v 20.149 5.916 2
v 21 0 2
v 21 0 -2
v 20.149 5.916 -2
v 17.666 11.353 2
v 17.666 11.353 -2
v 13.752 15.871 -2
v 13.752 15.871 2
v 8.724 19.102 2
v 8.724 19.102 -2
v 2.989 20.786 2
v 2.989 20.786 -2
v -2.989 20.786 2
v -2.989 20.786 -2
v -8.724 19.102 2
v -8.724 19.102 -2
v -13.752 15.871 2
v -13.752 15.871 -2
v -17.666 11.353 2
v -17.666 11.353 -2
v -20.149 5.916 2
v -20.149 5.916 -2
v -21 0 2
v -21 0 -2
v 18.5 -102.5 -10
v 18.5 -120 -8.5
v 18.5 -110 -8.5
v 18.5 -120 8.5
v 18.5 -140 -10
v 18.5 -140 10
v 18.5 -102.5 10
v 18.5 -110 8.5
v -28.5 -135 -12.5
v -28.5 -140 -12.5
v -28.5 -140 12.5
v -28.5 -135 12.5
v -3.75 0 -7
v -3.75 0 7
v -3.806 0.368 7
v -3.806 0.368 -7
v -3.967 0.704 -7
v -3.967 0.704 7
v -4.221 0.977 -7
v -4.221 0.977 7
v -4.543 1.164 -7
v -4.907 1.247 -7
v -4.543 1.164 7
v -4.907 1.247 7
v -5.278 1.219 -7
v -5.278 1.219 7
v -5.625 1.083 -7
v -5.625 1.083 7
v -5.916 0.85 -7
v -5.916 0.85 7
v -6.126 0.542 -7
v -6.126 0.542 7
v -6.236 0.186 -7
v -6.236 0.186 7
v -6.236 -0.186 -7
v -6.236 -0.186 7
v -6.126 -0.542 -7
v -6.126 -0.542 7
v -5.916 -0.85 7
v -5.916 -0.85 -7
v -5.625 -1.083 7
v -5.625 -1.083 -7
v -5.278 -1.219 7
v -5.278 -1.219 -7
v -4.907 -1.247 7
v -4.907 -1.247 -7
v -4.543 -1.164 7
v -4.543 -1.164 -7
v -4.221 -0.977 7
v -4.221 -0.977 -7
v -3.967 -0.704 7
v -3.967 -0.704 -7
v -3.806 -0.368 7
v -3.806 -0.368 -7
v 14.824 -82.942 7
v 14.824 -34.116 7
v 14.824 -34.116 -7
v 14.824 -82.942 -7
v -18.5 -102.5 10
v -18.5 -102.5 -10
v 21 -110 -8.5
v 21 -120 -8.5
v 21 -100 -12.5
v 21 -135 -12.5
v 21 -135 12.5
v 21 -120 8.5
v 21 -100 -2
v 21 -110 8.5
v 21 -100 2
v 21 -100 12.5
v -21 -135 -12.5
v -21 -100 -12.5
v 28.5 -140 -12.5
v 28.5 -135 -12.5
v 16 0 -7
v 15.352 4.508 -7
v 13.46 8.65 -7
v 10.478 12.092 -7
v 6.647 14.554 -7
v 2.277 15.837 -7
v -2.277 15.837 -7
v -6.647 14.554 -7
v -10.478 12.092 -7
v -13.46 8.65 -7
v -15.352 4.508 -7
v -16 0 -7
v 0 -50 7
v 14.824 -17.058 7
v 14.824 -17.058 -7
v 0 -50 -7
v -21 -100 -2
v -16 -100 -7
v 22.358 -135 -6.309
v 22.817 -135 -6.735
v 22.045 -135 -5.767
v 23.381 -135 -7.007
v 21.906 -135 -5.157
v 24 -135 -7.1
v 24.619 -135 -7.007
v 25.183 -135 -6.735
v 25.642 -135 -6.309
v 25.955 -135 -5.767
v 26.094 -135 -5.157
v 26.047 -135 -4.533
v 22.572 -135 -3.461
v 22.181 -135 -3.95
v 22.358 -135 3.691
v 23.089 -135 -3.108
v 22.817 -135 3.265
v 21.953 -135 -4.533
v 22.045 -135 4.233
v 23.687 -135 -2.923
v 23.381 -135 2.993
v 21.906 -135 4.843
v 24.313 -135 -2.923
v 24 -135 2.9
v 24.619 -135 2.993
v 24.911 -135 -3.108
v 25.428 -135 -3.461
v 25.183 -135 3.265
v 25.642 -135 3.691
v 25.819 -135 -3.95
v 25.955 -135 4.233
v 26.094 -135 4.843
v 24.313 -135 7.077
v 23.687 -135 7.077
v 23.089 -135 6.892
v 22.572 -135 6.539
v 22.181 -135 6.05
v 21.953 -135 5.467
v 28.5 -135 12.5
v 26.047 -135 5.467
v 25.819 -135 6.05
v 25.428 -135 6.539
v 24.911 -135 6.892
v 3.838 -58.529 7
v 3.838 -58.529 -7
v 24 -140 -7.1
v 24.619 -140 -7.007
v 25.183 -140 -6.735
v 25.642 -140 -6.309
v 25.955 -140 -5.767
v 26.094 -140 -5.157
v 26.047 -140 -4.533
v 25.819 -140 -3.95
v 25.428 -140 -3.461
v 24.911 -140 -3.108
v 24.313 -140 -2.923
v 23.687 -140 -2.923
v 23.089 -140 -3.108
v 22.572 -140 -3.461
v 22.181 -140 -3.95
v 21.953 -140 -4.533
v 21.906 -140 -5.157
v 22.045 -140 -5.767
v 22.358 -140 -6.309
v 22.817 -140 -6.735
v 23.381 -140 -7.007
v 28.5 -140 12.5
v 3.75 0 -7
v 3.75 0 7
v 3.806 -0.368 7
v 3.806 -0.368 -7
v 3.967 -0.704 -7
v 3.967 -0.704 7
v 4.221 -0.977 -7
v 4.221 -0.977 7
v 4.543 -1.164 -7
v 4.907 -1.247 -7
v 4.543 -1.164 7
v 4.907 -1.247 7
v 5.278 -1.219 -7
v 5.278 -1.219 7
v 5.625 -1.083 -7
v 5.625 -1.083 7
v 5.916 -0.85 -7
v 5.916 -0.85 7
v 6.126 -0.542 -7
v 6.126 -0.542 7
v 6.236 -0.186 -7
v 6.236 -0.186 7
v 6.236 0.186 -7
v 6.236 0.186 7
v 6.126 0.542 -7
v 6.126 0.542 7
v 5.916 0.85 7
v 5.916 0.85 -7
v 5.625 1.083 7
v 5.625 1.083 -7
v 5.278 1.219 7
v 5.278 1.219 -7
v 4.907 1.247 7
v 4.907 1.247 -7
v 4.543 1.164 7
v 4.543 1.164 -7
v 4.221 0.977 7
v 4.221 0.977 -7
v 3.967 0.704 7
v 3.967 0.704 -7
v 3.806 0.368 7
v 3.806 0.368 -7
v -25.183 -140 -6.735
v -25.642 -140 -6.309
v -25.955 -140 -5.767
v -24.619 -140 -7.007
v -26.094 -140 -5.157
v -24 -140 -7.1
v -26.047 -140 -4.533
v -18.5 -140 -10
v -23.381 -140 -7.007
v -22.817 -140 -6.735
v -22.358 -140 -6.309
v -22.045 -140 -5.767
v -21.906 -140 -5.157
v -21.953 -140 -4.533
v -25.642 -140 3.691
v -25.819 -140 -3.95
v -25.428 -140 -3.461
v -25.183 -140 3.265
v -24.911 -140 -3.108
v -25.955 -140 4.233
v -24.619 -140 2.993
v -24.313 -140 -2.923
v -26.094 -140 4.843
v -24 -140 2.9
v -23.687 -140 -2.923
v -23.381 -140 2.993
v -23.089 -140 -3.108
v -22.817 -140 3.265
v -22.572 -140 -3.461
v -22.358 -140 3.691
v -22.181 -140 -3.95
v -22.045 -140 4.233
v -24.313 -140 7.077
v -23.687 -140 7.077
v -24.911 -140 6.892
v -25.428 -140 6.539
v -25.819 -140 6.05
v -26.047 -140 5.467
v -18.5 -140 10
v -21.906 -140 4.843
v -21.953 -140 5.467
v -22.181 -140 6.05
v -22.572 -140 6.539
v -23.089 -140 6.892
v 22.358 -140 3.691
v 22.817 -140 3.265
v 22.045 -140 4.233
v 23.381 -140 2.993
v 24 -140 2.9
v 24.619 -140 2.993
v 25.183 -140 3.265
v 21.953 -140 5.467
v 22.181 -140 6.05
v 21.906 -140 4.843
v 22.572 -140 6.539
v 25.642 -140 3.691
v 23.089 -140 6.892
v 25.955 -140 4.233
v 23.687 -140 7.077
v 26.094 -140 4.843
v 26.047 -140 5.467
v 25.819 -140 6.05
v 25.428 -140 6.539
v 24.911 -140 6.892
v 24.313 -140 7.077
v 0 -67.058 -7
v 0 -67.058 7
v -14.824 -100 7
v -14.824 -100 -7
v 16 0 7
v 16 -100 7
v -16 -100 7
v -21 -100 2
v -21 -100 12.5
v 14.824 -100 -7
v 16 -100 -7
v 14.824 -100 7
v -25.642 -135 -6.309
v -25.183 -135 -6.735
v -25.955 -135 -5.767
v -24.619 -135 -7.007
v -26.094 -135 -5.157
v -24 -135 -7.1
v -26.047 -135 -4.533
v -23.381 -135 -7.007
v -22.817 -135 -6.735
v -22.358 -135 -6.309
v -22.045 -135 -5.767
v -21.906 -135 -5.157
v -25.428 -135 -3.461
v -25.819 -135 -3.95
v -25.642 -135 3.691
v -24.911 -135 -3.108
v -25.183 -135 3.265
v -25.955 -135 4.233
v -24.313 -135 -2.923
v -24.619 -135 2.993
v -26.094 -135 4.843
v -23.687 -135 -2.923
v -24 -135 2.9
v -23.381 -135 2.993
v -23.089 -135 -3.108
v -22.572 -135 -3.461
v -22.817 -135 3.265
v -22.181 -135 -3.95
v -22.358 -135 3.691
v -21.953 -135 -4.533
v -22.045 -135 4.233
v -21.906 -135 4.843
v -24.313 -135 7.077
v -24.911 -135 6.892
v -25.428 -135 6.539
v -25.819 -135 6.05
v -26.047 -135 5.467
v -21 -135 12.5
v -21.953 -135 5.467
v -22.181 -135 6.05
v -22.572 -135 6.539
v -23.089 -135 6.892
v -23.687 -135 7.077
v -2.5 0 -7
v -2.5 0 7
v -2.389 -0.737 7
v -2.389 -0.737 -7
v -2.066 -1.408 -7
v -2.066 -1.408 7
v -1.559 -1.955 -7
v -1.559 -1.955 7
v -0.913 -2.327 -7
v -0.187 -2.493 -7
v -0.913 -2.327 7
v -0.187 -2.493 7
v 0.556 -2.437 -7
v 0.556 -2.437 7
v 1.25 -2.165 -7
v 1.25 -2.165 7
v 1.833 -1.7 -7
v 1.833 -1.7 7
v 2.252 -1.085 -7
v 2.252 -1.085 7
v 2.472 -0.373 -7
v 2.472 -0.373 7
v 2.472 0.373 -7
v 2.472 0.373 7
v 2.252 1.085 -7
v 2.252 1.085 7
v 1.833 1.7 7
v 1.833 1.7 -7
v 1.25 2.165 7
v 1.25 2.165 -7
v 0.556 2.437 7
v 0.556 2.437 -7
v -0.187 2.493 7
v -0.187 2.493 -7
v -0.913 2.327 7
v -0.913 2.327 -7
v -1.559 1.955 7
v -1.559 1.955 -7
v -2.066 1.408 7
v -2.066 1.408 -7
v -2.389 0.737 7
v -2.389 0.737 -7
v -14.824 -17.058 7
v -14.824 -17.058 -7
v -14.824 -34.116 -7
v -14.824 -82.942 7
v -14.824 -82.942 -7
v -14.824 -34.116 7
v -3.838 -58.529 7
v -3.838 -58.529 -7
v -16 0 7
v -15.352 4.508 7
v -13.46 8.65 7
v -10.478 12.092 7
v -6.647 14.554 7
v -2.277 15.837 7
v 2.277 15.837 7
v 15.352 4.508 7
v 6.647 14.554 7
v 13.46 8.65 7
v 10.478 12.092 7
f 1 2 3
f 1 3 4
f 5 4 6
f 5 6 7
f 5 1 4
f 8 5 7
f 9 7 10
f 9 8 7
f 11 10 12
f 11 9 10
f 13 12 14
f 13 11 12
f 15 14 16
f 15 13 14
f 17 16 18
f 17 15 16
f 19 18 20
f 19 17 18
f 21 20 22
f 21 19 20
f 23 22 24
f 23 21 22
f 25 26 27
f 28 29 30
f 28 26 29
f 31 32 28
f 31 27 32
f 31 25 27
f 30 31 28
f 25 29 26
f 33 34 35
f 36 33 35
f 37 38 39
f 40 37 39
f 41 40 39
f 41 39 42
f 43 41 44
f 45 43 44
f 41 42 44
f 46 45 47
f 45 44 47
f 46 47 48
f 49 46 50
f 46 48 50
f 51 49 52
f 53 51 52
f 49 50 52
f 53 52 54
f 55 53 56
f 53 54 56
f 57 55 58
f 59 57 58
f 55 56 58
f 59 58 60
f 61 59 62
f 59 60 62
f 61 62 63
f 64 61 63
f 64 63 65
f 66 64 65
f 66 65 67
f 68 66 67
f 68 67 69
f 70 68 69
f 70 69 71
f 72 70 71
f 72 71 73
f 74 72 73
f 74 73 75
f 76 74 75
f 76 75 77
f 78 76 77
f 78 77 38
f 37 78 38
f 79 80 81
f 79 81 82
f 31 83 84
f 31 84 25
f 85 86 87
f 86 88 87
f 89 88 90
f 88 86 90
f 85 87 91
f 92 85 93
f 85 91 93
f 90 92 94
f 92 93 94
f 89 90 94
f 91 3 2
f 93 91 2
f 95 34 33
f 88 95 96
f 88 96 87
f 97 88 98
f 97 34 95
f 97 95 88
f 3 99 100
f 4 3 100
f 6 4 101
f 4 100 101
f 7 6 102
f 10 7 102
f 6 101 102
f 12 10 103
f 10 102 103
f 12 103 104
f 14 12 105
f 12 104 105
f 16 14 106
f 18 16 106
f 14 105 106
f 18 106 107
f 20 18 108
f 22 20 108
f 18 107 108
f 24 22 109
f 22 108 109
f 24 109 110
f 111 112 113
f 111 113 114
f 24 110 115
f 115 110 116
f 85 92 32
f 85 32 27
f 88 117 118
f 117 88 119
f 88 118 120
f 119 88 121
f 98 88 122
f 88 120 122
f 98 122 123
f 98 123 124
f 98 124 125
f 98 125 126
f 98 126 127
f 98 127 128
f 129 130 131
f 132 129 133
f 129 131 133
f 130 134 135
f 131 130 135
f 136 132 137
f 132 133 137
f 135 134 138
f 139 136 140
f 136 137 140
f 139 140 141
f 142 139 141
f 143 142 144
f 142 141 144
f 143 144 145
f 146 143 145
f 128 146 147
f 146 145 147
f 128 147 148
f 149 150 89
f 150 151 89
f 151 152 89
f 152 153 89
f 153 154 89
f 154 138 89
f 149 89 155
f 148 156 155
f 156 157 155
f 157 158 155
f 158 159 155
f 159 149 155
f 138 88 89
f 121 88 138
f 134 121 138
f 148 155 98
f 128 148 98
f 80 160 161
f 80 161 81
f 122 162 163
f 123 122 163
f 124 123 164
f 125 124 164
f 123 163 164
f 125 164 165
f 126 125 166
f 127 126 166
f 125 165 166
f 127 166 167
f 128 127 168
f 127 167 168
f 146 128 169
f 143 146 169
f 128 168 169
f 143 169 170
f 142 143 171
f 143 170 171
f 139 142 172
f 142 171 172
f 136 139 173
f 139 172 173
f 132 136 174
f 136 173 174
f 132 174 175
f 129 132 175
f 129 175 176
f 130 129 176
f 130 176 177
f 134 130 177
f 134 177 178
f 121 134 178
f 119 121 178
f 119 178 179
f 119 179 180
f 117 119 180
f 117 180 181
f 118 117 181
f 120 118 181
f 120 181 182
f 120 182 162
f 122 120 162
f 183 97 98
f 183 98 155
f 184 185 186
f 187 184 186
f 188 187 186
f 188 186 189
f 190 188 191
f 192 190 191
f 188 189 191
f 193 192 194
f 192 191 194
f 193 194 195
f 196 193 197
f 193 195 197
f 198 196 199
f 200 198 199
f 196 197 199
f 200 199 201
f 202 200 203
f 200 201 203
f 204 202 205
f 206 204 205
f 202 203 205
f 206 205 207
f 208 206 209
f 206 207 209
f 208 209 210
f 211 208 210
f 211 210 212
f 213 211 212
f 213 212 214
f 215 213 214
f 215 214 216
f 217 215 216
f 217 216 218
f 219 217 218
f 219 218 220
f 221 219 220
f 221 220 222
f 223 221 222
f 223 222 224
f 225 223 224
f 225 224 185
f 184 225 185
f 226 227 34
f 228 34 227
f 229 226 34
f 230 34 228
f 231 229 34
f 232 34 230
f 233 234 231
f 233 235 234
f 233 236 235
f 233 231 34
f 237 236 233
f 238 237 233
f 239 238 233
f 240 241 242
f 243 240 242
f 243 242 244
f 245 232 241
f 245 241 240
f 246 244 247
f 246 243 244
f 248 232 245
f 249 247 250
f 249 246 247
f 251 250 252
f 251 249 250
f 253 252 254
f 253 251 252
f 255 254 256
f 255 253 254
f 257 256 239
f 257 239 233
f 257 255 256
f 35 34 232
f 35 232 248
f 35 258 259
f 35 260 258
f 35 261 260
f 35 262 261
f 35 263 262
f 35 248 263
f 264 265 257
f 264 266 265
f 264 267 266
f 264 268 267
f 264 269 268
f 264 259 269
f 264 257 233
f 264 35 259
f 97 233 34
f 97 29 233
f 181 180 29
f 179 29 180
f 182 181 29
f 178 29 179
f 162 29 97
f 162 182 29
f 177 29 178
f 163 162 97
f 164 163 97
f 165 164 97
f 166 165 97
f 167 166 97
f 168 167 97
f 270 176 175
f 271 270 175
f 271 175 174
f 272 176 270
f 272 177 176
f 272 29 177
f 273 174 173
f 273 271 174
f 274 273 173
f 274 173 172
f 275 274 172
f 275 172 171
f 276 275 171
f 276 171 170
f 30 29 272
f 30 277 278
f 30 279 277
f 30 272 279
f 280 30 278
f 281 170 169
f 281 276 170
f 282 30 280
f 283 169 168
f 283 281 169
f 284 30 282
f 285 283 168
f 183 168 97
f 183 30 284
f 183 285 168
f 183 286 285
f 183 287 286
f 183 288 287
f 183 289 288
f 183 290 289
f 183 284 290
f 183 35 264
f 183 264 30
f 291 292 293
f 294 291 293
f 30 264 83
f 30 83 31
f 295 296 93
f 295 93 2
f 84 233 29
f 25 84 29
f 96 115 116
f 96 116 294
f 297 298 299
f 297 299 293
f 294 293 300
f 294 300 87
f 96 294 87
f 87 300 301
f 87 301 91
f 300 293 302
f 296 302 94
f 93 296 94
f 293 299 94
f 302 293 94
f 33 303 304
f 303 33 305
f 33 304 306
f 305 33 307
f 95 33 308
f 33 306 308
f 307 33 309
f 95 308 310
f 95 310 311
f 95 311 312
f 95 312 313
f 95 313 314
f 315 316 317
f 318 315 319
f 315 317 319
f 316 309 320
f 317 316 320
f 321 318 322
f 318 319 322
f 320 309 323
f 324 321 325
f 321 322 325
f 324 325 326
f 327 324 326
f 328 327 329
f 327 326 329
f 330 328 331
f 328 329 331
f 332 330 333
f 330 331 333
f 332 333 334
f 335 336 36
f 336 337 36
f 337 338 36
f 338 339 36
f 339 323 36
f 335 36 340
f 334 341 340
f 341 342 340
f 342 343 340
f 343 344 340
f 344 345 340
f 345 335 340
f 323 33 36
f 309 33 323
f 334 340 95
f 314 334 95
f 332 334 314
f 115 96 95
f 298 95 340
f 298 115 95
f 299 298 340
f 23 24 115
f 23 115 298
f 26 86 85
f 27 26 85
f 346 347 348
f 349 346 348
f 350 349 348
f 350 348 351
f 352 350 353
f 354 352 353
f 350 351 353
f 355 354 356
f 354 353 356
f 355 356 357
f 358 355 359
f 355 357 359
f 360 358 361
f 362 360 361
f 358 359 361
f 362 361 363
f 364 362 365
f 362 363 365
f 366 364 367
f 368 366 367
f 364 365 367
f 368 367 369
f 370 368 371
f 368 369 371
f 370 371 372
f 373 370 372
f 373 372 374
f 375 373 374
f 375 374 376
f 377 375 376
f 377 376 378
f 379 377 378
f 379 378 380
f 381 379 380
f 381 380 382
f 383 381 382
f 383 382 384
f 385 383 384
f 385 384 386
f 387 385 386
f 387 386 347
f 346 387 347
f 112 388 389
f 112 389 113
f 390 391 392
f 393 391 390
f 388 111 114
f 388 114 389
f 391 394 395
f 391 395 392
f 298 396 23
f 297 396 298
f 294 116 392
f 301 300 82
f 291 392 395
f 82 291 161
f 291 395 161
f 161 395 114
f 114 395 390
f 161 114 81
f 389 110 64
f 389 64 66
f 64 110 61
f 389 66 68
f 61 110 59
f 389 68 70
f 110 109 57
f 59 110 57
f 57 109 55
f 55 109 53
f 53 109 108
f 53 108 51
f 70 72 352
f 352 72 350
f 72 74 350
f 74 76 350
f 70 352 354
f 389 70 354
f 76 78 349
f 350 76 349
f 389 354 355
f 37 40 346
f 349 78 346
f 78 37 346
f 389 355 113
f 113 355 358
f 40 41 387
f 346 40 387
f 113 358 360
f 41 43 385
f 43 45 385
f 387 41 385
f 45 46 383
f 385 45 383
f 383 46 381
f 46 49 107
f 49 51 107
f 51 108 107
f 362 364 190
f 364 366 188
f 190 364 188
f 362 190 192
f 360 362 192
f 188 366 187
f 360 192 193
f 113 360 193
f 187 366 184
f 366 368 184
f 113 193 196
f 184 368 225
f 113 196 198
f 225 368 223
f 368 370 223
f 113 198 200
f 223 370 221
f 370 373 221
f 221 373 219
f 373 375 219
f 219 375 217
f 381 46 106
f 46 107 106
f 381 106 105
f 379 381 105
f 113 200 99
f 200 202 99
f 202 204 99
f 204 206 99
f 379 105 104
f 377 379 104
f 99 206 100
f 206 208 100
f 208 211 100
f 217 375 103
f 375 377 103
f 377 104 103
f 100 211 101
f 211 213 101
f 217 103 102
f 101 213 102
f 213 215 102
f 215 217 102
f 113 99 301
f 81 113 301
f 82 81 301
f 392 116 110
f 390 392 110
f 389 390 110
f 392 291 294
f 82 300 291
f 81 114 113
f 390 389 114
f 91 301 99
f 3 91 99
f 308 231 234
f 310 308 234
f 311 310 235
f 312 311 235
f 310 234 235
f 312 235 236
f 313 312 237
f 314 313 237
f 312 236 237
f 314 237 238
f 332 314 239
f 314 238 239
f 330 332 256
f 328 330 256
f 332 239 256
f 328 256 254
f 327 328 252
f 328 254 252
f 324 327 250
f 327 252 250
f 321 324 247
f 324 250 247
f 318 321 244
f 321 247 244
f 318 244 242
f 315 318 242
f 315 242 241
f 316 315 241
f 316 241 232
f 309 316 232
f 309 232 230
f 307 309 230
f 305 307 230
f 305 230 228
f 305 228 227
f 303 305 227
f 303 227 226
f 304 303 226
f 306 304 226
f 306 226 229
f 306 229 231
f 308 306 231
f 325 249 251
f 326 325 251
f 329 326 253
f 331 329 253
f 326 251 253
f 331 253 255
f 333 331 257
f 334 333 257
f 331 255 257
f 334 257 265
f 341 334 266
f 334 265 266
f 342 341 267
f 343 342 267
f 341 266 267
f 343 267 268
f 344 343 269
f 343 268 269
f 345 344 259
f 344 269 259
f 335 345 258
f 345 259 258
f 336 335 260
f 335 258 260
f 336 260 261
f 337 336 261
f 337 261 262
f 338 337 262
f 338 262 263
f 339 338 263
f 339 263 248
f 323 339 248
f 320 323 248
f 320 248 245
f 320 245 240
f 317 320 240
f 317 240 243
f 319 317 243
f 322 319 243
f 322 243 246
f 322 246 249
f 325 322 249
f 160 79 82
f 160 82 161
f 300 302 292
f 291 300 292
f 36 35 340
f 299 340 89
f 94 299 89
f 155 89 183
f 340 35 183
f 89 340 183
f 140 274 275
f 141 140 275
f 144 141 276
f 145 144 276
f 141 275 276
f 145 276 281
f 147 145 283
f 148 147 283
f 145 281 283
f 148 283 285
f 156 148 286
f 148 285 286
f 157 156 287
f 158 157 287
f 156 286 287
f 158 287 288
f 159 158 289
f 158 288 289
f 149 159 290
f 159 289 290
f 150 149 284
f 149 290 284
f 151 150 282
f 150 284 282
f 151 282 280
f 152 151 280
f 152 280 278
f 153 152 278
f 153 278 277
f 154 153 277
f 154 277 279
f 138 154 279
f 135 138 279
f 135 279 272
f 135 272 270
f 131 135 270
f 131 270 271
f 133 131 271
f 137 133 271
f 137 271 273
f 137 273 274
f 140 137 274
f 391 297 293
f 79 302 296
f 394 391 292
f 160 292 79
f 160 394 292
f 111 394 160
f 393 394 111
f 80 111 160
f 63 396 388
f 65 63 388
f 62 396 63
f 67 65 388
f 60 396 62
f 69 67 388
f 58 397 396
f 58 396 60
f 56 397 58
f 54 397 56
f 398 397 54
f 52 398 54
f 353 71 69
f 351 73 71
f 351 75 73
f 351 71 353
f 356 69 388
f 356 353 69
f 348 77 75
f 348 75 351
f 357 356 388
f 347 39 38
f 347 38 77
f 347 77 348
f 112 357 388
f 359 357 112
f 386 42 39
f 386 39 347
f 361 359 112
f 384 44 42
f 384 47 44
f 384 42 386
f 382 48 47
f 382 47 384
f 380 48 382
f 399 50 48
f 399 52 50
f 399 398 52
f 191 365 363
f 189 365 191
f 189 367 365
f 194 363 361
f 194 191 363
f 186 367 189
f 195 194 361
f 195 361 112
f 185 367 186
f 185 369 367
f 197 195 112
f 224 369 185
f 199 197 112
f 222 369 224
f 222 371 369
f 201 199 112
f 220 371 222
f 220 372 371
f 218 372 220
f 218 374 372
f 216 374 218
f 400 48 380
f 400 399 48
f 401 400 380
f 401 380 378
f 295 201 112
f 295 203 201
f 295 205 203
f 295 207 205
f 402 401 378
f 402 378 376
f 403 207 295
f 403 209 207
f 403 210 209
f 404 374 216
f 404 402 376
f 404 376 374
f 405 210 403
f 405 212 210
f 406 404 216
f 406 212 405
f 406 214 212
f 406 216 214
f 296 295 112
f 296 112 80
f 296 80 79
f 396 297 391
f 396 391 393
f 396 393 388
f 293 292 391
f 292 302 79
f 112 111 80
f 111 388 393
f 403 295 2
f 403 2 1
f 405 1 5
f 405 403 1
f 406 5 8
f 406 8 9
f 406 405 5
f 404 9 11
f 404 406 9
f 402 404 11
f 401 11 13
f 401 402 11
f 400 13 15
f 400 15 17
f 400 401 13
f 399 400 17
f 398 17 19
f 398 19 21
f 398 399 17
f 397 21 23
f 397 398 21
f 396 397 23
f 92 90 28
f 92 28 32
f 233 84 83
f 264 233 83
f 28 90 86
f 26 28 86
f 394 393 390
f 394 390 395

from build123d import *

# Parameters (mm, degrees)
BOSS_EXTRUDE1_DEPTH = 7
SKETCH2_W           = 42
SKETCH2_H           = 25
BOSS_EXTRUDE2_DEPTH = 40
SHELL1_T            = -2.5
CUT_EXTRUDE5_REACH  = 144.903
SKETCH9_W           = 10
SKETCH9_H           = 25
BOSS_EXTRUDE3_DEPTH = 5
CUT_EXTRUDE6_REACH  = 151.018
SKETCH10_W          = 17
SKETCH10_H          = 10
CUT_EXTRUDE8_REACH  = 146.196
CUT_EXTRUDE9_REACH  = 165.98
SKETCH13_R          = 2.1
CHAMFER1_SIZE       = 5


with BuildPart() as part:
    # Sketch1 → Boss-Extrude1 (new, symmetric)
    with BuildSketch(Plane.XY):
        with BuildLine():
            Line((-21, 0), (-21, -100))
            Line((-21, -100), (21, -100))
            Line((21, -100), (21, 0))
            ThreePointArc((21, 0), (0, 21), (-21, 0))
        make_face()
    extrude(amount=BOSS_EXTRUDE1_DEPTH, both=True)


with BuildPart() as body_2:
    # Sketch2 → Boss-Extrude2 (new body)
    with BuildSketch(Plane.XZ.offset(100)):
        Rectangle(SKETCH2_W, SKETCH2_H)
    extrude(amount=BOSS_EXTRUDE2_DEPTH)

    # Shell1
    shell1_openings = [body_2.faces().sort_by_distance(p)[0] for p in [
        (0, -140, 0),
    ]]
    offset(amount=SHELL1_T, openings=shell1_openings, kind=Kind.INTERSECTION)


with BuildPart() as part_1:
    add(part.part)

    # Combine1: union body 2
    add(body_2.part)

    # Sketch8 → Cut-Extrude5 (cut, up to next)
    with BuildSketch(Plane.XY.offset(7), mode=Mode.PRIVATE) as cut_extrude5_sk1:
        with BuildLine():
            ThreePointArc((-3.75, 0), (-5, 1.25), (-6.25, 0))
            Line((-6.25, 0), (-3.75, 0))
        make_face()
    cut_extrude5_tool1 = extrude(cut_extrude5_sk1.sketch, amount=-CUT_EXTRUDE5_REACH, mode=Mode.PRIVATE) & part_1.part
    # Sketch8 → Cut-Extrude5 (cut, up to next)
    with BuildSketch(Plane.XY.offset(7), mode=Mode.PRIVATE) as cut_extrude5_sk2:
        with BuildLine():
            Line((-3.75, 0), (-6.25, 0))
            ThreePointArc((-6.25, 0), (-5, -1.25), (-3.75, 0))
        make_face()
    cut_extrude5_tool2 = extrude(cut_extrude5_sk2.sketch, amount=-CUT_EXTRUDE5_REACH, mode=Mode.PRIVATE) & part_1.part
    # Sketch8 → Cut-Extrude5 (cut, up to next)
    with BuildSketch(Plane.XY.offset(7), mode=Mode.PRIVATE) as cut_extrude5_sk3:
        with BuildLine():
            ThreePointArc((-3.75, 0), (-5, 1.25), (-6.25, 0))
            Line((-6.25, 0), (-3.75, 0))
        make_face()
    cut_extrude5_tool3 = extrude(cut_extrude5_sk3.sketch, amount=-CUT_EXTRUDE5_REACH, mode=Mode.PRIVATE) & part_1.part
    # Sketch8 → Cut-Extrude5 (cut, up to next)
    with BuildSketch(Plane.XY.offset(7), mode=Mode.PRIVATE) as cut_extrude5_sk4:
        with BuildLine():
            Line((-3.75, 0), (-6.25, 0))
            ThreePointArc((-6.25, 0), (-5, -1.25), (-3.75, 0))
        make_face()
    cut_extrude5_tool4 = extrude(cut_extrude5_sk4.sketch, amount=-CUT_EXTRUDE5_REACH, mode=Mode.PRIVATE) & part_1.part
    # Sketch8 → Cut-Extrude5 (cut, up to next)
    with BuildSketch(Plane.XY.offset(7), mode=Mode.PRIVATE) as cut_extrude5_sk5:
        with BuildLine():
            ThreePointArc((3.75, 0), (5, -1.25), (6.25, 0))
            Line((6.25, 0), (3.75, 0))
        make_face()
    cut_extrude5_tool5 = extrude(cut_extrude5_sk5.sketch, amount=-CUT_EXTRUDE5_REACH, mode=Mode.PRIVATE) & part_1.part
    # Sketch8 → Cut-Extrude5 (cut, up to next)
    with BuildSketch(Plane.XY.offset(7), mode=Mode.PRIVATE) as cut_extrude5_sk6:
        with BuildLine():
            Line((3.75, 0), (6.25, 0))
            ThreePointArc((6.25, 0), (5, 1.25), (3.75, 0))
        make_face()
    cut_extrude5_tool6 = extrude(cut_extrude5_sk6.sketch, amount=-CUT_EXTRUDE5_REACH, mode=Mode.PRIVATE) & part_1.part
    # Sketch8 → Cut-Extrude5 (cut, up to next)
    with BuildSketch(Plane.XY.offset(7), mode=Mode.PRIVATE) as cut_extrude5_sk7:
        with BuildLine():
            ThreePointArc((3.75, 0), (5, -1.25), (6.25, 0))
            Line((6.25, 0), (3.75, 0))
        make_face()
    cut_extrude5_tool7 = extrude(cut_extrude5_sk7.sketch, amount=-CUT_EXTRUDE5_REACH, mode=Mode.PRIVATE) & part_1.part
    # Sketch8 → Cut-Extrude5 (cut, up to next)
    with BuildSketch(Plane.XY.offset(7), mode=Mode.PRIVATE) as cut_extrude5_sk8:
        with BuildLine():
            Line((3.75, 0), (6.25, 0))
            ThreePointArc((6.25, 0), (5, 1.25), (3.75, 0))
        make_face()
    cut_extrude5_tool8 = extrude(cut_extrude5_sk8.sketch, amount=-CUT_EXTRUDE5_REACH, mode=Mode.PRIVATE) & part_1.part
    # Sketch8 → Cut-Extrude5 (cut, up to next)
    with BuildSketch(Plane.XY.offset(7), mode=Mode.PRIVATE) as cut_extrude5_sk9:
        with BuildLine():
            ThreePointArc((-2.5, 0), (0, -2.5), (2.5, 0))
            Line((2.5, 0), (-2.5, 0))
        make_face()
    cut_extrude5_tool9 = extrude(cut_extrude5_sk9.sketch, amount=-CUT_EXTRUDE5_REACH, mode=Mode.PRIVATE) & part_1.part
    # Sketch8 → Cut-Extrude5 (cut, up to next)
    with BuildSketch(Plane.XY.offset(7), mode=Mode.PRIVATE) as cut_extrude5_sk10:
        with BuildLine():
            Line((-2.5, 0), (2.5, 0))
            ThreePointArc((2.5, 0), (0, 2.5), (-2.5, 0))
        make_face()
    cut_extrude5_tool10 = extrude(cut_extrude5_sk10.sketch, amount=-CUT_EXTRUDE5_REACH, mode=Mode.PRIVATE) & part_1.part
    # Sketch8 → Cut-Extrude5 (cut, up to next)
    with BuildSketch(Plane.XY.offset(7), mode=Mode.PRIVATE) as cut_extrude5_sk11:
        with BuildLine():
            ThreePointArc((-2.5, 0), (0, -2.5), (2.5, 0))
            Line((2.5, 0), (-2.5, 0))
        make_face()
    cut_extrude5_tool11 = extrude(cut_extrude5_sk11.sketch, amount=-CUT_EXTRUDE5_REACH, mode=Mode.PRIVATE) & part_1.part
    # Sketch8 → Cut-Extrude5 (cut, up to next)
    with BuildSketch(Plane.XY.offset(7), mode=Mode.PRIVATE) as cut_extrude5_sk12:
        with BuildLine():
            Line((-2.5, 0), (2.5, 0))
            ThreePointArc((2.5, 0), (0, 2.5), (-2.5, 0))
        make_face()
    cut_extrude5_tool12 = extrude(cut_extrude5_sk12.sketch, amount=-CUT_EXTRUDE5_REACH, mode=Mode.PRIVATE) & part_1.part
    add(cut_extrude5_tool1.solids().sort_by_distance((-5, 0.530516, 7))[0], mode=Mode.SUBTRACT)
    add(cut_extrude5_tool2.solids().sort_by_distance((-5, -0.530516, 7))[0], mode=Mode.SUBTRACT)
    add(cut_extrude5_tool3.solids().sort_by_distance((-5, 0.530516, 7))[0], mode=Mode.SUBTRACT)
    add(cut_extrude5_tool4.solids().sort_by_distance((-5, -0.530516, 7))[0], mode=Mode.SUBTRACT)
    add(cut_extrude5_tool5.solids().sort_by_distance((5, -0.530516, 7))[0], mode=Mode.SUBTRACT)
    add(cut_extrude5_tool6.solids().sort_by_distance((5, 0.530516, 7))[0], mode=Mode.SUBTRACT)
    add(cut_extrude5_tool7.solids().sort_by_distance((5, -0.530516, 7))[0], mode=Mode.SUBTRACT)
    add(cut_extrude5_tool8.solids().sort_by_distance((5, 0.530516, 7))[0], mode=Mode.SUBTRACT)
    add(cut_extrude5_tool9.solids().sort_by_distance((0, -1.061033, 7))[0], mode=Mode.SUBTRACT)
    add(cut_extrude5_tool10.solids().sort_by_distance((0, 1.061033, 7))[0], mode=Mode.SUBTRACT)
    add(cut_extrude5_tool11.solids().sort_by_distance((0, -1.061033, 7))[0], mode=Mode.SUBTRACT)
    add(cut_extrude5_tool12.solids().sort_by_distance((0, 1.061033, 7))[0], mode=Mode.SUBTRACT)

    # Sketch9 → Boss-Extrude3 (add)
    with BuildSketch(Plane.XZ.offset(140)):
        with Locations((-23.5, 0)):
            Rectangle(SKETCH9_W, SKETCH9_H)
        with Locations((23.5, 0)):
            Rectangle(SKETCH9_W, SKETCH9_H)
    extrude(amount=-BOSS_EXTRUDE3_DEPTH)

    # Sketch10 → Cut-Extrude6 (cut, up to next)
    with BuildSketch(Plane(origin=(21, 0, 0), x_dir=(0, 0, -1), z_dir=(1, 0, 0)), mode=Mode.PRIVATE) as cut_extrude6_sk1:
        with Locations((0, -115)):
            Rectangle(SKETCH10_W, SKETCH10_H)
    cut_extrude6_tool1 = extrude(cut_extrude6_sk1.sketch, amount=-CUT_EXTRUDE6_REACH, mode=Mode.PRIVATE) & part_1.part
    add(cut_extrude6_tool1.solids().sort_by_distance((21, -115, 0))[0], mode=Mode.SUBTRACT)

    # Sketch12 → Cut-Extrude8 (cut, up to next)
    with BuildSketch(Plane.XY.offset(7), mode=Mode.PRIVATE) as cut_extrude8_sk1:
        Polygon((14.82390073, -17.057998377), (0, -50), (-14.82390073, -17.057998377), align=None)
    cut_extrude8_tool1 = extrude(cut_extrude8_sk1.sketch, amount=-CUT_EXTRUDE8_REACH, mode=Mode.PRIVATE) & part_1.part
    # Sketch12 → Cut-Extrude8 (cut, up to next)
    with BuildSketch(Plane.XY.offset(7), mode=Mode.PRIVATE) as cut_extrude8_sk2:
        Polygon((-14.82390073, -34.115996755), (-3.838049635, -58.528999189), (-14.82390073, -82.942001623), align=None)
    cut_extrude8_tool2 = extrude(cut_extrude8_sk2.sketch, amount=-CUT_EXTRUDE8_REACH, mode=Mode.PRIVATE) & part_1.part
    # Sketch12 → Cut-Extrude8 (cut, up to next)
    with BuildSketch(Plane.XY.offset(7), mode=Mode.PRIVATE) as cut_extrude8_sk3:
        Polygon((14.82390073, -100), (0, -67.057998377), (-14.82390073, -100), align=None)
    cut_extrude8_tool3 = extrude(cut_extrude8_sk3.sketch, amount=-CUT_EXTRUDE8_REACH, mode=Mode.PRIVATE) & part_1.part
    # Sketch12 → Cut-Extrude8 (cut, up to next)
    with BuildSketch(Plane.XY.offset(7), mode=Mode.PRIVATE) as cut_extrude8_sk4:
        Polygon((14.82390073, -34.115996755), (14.82390073, -82.942001623), (3.838049635, -58.528999189), align=None)
    cut_extrude8_tool4 = extrude(cut_extrude8_sk4.sketch, amount=-CUT_EXTRUDE8_REACH, mode=Mode.PRIVATE) & part_1.part
    add(cut_extrude8_tool1.solids().sort_by_distance((0, -28.038666, 7))[0], mode=Mode.SUBTRACT)
    add(cut_extrude8_tool2.solids().sort_by_distance((-11.16195, -58.528999, 7))[0], mode=Mode.SUBTRACT)
    add(cut_extrude8_tool3.solids().sort_by_distance((0, -89.019333, 7))[0], mode=Mode.SUBTRACT)
    add(cut_extrude8_tool4.solids().sort_by_distance((11.16195, -58.528999, 7))[0], mode=Mode.SUBTRACT)

    # Sketch13 → Cut-Extrude9 (cut, up to next)
    with BuildSketch(Plane.XZ.offset(140), mode=Mode.PRIVATE) as cut_extrude9_sk1:
        with Locations(Location((-24, 5, 0), (0, 0, 270))):
            Circle(SKETCH13_R)
    cut_extrude9_tool1 = extrude(cut_extrude9_sk1.sketch, amount=-CUT_EXTRUDE9_REACH, mode=Mode.PRIVATE) & part_1.part
    # Sketch13 → Cut-Extrude9 (cut, up to next)
    with BuildSketch(Plane.XZ.offset(140), mode=Mode.PRIVATE) as cut_extrude9_sk2:
        with Locations(Location((-24, -5, 0), (0, 0, 270))):
            Circle(SKETCH13_R)
    cut_extrude9_tool2 = extrude(cut_extrude9_sk2.sketch, amount=-CUT_EXTRUDE9_REACH, mode=Mode.PRIVATE) & part_1.part
    # Sketch13 → Cut-Extrude9 (cut, up to next)
    with BuildSketch(Plane.XZ.offset(140), mode=Mode.PRIVATE) as cut_extrude9_sk3:
        with Locations(Location((24, 5, 0), (0, 0, 270))):
            Circle(SKETCH13_R)
    cut_extrude9_tool3 = extrude(cut_extrude9_sk3.sketch, amount=-CUT_EXTRUDE9_REACH, mode=Mode.PRIVATE) & part_1.part
    # Sketch13 → Cut-Extrude9 (cut, up to next)
    with BuildSketch(Plane.XZ.offset(140), mode=Mode.PRIVATE) as cut_extrude9_sk4:
        with Locations(Location((24, -5, 0), (0, 0, 270))):
            Circle(SKETCH13_R)
    cut_extrude9_tool4 = extrude(cut_extrude9_sk4.sketch, amount=-CUT_EXTRUDE9_REACH, mode=Mode.PRIVATE) & part_1.part
    add(cut_extrude9_tool1.solids().sort_by_distance((-24, -140, 5))[0], mode=Mode.SUBTRACT)
    add(cut_extrude9_tool2.solids().sort_by_distance((-24, -140, -5))[0], mode=Mode.SUBTRACT)
    add(cut_extrude9_tool3.solids().sort_by_distance((24, -140, 5))[0], mode=Mode.SUBTRACT)
    add(cut_extrude9_tool4.solids().sort_by_distance((24, -140, -5))[0], mode=Mode.SUBTRACT)

    # Chamfer1
    chamfer1_edges = [part_1.edges().sort_by_distance(p)[0] for p in [
        (21, -50, 7),
        (0, 21, 7),
        (21, -50, -7),
        (-21, -50, -7),
        (0, 21, -7),
        (-21, -50, 7),
    ]]
    chamfer(chamfer1_edges, length=CHAMFER1_SIZE)


solid = part_1.part
